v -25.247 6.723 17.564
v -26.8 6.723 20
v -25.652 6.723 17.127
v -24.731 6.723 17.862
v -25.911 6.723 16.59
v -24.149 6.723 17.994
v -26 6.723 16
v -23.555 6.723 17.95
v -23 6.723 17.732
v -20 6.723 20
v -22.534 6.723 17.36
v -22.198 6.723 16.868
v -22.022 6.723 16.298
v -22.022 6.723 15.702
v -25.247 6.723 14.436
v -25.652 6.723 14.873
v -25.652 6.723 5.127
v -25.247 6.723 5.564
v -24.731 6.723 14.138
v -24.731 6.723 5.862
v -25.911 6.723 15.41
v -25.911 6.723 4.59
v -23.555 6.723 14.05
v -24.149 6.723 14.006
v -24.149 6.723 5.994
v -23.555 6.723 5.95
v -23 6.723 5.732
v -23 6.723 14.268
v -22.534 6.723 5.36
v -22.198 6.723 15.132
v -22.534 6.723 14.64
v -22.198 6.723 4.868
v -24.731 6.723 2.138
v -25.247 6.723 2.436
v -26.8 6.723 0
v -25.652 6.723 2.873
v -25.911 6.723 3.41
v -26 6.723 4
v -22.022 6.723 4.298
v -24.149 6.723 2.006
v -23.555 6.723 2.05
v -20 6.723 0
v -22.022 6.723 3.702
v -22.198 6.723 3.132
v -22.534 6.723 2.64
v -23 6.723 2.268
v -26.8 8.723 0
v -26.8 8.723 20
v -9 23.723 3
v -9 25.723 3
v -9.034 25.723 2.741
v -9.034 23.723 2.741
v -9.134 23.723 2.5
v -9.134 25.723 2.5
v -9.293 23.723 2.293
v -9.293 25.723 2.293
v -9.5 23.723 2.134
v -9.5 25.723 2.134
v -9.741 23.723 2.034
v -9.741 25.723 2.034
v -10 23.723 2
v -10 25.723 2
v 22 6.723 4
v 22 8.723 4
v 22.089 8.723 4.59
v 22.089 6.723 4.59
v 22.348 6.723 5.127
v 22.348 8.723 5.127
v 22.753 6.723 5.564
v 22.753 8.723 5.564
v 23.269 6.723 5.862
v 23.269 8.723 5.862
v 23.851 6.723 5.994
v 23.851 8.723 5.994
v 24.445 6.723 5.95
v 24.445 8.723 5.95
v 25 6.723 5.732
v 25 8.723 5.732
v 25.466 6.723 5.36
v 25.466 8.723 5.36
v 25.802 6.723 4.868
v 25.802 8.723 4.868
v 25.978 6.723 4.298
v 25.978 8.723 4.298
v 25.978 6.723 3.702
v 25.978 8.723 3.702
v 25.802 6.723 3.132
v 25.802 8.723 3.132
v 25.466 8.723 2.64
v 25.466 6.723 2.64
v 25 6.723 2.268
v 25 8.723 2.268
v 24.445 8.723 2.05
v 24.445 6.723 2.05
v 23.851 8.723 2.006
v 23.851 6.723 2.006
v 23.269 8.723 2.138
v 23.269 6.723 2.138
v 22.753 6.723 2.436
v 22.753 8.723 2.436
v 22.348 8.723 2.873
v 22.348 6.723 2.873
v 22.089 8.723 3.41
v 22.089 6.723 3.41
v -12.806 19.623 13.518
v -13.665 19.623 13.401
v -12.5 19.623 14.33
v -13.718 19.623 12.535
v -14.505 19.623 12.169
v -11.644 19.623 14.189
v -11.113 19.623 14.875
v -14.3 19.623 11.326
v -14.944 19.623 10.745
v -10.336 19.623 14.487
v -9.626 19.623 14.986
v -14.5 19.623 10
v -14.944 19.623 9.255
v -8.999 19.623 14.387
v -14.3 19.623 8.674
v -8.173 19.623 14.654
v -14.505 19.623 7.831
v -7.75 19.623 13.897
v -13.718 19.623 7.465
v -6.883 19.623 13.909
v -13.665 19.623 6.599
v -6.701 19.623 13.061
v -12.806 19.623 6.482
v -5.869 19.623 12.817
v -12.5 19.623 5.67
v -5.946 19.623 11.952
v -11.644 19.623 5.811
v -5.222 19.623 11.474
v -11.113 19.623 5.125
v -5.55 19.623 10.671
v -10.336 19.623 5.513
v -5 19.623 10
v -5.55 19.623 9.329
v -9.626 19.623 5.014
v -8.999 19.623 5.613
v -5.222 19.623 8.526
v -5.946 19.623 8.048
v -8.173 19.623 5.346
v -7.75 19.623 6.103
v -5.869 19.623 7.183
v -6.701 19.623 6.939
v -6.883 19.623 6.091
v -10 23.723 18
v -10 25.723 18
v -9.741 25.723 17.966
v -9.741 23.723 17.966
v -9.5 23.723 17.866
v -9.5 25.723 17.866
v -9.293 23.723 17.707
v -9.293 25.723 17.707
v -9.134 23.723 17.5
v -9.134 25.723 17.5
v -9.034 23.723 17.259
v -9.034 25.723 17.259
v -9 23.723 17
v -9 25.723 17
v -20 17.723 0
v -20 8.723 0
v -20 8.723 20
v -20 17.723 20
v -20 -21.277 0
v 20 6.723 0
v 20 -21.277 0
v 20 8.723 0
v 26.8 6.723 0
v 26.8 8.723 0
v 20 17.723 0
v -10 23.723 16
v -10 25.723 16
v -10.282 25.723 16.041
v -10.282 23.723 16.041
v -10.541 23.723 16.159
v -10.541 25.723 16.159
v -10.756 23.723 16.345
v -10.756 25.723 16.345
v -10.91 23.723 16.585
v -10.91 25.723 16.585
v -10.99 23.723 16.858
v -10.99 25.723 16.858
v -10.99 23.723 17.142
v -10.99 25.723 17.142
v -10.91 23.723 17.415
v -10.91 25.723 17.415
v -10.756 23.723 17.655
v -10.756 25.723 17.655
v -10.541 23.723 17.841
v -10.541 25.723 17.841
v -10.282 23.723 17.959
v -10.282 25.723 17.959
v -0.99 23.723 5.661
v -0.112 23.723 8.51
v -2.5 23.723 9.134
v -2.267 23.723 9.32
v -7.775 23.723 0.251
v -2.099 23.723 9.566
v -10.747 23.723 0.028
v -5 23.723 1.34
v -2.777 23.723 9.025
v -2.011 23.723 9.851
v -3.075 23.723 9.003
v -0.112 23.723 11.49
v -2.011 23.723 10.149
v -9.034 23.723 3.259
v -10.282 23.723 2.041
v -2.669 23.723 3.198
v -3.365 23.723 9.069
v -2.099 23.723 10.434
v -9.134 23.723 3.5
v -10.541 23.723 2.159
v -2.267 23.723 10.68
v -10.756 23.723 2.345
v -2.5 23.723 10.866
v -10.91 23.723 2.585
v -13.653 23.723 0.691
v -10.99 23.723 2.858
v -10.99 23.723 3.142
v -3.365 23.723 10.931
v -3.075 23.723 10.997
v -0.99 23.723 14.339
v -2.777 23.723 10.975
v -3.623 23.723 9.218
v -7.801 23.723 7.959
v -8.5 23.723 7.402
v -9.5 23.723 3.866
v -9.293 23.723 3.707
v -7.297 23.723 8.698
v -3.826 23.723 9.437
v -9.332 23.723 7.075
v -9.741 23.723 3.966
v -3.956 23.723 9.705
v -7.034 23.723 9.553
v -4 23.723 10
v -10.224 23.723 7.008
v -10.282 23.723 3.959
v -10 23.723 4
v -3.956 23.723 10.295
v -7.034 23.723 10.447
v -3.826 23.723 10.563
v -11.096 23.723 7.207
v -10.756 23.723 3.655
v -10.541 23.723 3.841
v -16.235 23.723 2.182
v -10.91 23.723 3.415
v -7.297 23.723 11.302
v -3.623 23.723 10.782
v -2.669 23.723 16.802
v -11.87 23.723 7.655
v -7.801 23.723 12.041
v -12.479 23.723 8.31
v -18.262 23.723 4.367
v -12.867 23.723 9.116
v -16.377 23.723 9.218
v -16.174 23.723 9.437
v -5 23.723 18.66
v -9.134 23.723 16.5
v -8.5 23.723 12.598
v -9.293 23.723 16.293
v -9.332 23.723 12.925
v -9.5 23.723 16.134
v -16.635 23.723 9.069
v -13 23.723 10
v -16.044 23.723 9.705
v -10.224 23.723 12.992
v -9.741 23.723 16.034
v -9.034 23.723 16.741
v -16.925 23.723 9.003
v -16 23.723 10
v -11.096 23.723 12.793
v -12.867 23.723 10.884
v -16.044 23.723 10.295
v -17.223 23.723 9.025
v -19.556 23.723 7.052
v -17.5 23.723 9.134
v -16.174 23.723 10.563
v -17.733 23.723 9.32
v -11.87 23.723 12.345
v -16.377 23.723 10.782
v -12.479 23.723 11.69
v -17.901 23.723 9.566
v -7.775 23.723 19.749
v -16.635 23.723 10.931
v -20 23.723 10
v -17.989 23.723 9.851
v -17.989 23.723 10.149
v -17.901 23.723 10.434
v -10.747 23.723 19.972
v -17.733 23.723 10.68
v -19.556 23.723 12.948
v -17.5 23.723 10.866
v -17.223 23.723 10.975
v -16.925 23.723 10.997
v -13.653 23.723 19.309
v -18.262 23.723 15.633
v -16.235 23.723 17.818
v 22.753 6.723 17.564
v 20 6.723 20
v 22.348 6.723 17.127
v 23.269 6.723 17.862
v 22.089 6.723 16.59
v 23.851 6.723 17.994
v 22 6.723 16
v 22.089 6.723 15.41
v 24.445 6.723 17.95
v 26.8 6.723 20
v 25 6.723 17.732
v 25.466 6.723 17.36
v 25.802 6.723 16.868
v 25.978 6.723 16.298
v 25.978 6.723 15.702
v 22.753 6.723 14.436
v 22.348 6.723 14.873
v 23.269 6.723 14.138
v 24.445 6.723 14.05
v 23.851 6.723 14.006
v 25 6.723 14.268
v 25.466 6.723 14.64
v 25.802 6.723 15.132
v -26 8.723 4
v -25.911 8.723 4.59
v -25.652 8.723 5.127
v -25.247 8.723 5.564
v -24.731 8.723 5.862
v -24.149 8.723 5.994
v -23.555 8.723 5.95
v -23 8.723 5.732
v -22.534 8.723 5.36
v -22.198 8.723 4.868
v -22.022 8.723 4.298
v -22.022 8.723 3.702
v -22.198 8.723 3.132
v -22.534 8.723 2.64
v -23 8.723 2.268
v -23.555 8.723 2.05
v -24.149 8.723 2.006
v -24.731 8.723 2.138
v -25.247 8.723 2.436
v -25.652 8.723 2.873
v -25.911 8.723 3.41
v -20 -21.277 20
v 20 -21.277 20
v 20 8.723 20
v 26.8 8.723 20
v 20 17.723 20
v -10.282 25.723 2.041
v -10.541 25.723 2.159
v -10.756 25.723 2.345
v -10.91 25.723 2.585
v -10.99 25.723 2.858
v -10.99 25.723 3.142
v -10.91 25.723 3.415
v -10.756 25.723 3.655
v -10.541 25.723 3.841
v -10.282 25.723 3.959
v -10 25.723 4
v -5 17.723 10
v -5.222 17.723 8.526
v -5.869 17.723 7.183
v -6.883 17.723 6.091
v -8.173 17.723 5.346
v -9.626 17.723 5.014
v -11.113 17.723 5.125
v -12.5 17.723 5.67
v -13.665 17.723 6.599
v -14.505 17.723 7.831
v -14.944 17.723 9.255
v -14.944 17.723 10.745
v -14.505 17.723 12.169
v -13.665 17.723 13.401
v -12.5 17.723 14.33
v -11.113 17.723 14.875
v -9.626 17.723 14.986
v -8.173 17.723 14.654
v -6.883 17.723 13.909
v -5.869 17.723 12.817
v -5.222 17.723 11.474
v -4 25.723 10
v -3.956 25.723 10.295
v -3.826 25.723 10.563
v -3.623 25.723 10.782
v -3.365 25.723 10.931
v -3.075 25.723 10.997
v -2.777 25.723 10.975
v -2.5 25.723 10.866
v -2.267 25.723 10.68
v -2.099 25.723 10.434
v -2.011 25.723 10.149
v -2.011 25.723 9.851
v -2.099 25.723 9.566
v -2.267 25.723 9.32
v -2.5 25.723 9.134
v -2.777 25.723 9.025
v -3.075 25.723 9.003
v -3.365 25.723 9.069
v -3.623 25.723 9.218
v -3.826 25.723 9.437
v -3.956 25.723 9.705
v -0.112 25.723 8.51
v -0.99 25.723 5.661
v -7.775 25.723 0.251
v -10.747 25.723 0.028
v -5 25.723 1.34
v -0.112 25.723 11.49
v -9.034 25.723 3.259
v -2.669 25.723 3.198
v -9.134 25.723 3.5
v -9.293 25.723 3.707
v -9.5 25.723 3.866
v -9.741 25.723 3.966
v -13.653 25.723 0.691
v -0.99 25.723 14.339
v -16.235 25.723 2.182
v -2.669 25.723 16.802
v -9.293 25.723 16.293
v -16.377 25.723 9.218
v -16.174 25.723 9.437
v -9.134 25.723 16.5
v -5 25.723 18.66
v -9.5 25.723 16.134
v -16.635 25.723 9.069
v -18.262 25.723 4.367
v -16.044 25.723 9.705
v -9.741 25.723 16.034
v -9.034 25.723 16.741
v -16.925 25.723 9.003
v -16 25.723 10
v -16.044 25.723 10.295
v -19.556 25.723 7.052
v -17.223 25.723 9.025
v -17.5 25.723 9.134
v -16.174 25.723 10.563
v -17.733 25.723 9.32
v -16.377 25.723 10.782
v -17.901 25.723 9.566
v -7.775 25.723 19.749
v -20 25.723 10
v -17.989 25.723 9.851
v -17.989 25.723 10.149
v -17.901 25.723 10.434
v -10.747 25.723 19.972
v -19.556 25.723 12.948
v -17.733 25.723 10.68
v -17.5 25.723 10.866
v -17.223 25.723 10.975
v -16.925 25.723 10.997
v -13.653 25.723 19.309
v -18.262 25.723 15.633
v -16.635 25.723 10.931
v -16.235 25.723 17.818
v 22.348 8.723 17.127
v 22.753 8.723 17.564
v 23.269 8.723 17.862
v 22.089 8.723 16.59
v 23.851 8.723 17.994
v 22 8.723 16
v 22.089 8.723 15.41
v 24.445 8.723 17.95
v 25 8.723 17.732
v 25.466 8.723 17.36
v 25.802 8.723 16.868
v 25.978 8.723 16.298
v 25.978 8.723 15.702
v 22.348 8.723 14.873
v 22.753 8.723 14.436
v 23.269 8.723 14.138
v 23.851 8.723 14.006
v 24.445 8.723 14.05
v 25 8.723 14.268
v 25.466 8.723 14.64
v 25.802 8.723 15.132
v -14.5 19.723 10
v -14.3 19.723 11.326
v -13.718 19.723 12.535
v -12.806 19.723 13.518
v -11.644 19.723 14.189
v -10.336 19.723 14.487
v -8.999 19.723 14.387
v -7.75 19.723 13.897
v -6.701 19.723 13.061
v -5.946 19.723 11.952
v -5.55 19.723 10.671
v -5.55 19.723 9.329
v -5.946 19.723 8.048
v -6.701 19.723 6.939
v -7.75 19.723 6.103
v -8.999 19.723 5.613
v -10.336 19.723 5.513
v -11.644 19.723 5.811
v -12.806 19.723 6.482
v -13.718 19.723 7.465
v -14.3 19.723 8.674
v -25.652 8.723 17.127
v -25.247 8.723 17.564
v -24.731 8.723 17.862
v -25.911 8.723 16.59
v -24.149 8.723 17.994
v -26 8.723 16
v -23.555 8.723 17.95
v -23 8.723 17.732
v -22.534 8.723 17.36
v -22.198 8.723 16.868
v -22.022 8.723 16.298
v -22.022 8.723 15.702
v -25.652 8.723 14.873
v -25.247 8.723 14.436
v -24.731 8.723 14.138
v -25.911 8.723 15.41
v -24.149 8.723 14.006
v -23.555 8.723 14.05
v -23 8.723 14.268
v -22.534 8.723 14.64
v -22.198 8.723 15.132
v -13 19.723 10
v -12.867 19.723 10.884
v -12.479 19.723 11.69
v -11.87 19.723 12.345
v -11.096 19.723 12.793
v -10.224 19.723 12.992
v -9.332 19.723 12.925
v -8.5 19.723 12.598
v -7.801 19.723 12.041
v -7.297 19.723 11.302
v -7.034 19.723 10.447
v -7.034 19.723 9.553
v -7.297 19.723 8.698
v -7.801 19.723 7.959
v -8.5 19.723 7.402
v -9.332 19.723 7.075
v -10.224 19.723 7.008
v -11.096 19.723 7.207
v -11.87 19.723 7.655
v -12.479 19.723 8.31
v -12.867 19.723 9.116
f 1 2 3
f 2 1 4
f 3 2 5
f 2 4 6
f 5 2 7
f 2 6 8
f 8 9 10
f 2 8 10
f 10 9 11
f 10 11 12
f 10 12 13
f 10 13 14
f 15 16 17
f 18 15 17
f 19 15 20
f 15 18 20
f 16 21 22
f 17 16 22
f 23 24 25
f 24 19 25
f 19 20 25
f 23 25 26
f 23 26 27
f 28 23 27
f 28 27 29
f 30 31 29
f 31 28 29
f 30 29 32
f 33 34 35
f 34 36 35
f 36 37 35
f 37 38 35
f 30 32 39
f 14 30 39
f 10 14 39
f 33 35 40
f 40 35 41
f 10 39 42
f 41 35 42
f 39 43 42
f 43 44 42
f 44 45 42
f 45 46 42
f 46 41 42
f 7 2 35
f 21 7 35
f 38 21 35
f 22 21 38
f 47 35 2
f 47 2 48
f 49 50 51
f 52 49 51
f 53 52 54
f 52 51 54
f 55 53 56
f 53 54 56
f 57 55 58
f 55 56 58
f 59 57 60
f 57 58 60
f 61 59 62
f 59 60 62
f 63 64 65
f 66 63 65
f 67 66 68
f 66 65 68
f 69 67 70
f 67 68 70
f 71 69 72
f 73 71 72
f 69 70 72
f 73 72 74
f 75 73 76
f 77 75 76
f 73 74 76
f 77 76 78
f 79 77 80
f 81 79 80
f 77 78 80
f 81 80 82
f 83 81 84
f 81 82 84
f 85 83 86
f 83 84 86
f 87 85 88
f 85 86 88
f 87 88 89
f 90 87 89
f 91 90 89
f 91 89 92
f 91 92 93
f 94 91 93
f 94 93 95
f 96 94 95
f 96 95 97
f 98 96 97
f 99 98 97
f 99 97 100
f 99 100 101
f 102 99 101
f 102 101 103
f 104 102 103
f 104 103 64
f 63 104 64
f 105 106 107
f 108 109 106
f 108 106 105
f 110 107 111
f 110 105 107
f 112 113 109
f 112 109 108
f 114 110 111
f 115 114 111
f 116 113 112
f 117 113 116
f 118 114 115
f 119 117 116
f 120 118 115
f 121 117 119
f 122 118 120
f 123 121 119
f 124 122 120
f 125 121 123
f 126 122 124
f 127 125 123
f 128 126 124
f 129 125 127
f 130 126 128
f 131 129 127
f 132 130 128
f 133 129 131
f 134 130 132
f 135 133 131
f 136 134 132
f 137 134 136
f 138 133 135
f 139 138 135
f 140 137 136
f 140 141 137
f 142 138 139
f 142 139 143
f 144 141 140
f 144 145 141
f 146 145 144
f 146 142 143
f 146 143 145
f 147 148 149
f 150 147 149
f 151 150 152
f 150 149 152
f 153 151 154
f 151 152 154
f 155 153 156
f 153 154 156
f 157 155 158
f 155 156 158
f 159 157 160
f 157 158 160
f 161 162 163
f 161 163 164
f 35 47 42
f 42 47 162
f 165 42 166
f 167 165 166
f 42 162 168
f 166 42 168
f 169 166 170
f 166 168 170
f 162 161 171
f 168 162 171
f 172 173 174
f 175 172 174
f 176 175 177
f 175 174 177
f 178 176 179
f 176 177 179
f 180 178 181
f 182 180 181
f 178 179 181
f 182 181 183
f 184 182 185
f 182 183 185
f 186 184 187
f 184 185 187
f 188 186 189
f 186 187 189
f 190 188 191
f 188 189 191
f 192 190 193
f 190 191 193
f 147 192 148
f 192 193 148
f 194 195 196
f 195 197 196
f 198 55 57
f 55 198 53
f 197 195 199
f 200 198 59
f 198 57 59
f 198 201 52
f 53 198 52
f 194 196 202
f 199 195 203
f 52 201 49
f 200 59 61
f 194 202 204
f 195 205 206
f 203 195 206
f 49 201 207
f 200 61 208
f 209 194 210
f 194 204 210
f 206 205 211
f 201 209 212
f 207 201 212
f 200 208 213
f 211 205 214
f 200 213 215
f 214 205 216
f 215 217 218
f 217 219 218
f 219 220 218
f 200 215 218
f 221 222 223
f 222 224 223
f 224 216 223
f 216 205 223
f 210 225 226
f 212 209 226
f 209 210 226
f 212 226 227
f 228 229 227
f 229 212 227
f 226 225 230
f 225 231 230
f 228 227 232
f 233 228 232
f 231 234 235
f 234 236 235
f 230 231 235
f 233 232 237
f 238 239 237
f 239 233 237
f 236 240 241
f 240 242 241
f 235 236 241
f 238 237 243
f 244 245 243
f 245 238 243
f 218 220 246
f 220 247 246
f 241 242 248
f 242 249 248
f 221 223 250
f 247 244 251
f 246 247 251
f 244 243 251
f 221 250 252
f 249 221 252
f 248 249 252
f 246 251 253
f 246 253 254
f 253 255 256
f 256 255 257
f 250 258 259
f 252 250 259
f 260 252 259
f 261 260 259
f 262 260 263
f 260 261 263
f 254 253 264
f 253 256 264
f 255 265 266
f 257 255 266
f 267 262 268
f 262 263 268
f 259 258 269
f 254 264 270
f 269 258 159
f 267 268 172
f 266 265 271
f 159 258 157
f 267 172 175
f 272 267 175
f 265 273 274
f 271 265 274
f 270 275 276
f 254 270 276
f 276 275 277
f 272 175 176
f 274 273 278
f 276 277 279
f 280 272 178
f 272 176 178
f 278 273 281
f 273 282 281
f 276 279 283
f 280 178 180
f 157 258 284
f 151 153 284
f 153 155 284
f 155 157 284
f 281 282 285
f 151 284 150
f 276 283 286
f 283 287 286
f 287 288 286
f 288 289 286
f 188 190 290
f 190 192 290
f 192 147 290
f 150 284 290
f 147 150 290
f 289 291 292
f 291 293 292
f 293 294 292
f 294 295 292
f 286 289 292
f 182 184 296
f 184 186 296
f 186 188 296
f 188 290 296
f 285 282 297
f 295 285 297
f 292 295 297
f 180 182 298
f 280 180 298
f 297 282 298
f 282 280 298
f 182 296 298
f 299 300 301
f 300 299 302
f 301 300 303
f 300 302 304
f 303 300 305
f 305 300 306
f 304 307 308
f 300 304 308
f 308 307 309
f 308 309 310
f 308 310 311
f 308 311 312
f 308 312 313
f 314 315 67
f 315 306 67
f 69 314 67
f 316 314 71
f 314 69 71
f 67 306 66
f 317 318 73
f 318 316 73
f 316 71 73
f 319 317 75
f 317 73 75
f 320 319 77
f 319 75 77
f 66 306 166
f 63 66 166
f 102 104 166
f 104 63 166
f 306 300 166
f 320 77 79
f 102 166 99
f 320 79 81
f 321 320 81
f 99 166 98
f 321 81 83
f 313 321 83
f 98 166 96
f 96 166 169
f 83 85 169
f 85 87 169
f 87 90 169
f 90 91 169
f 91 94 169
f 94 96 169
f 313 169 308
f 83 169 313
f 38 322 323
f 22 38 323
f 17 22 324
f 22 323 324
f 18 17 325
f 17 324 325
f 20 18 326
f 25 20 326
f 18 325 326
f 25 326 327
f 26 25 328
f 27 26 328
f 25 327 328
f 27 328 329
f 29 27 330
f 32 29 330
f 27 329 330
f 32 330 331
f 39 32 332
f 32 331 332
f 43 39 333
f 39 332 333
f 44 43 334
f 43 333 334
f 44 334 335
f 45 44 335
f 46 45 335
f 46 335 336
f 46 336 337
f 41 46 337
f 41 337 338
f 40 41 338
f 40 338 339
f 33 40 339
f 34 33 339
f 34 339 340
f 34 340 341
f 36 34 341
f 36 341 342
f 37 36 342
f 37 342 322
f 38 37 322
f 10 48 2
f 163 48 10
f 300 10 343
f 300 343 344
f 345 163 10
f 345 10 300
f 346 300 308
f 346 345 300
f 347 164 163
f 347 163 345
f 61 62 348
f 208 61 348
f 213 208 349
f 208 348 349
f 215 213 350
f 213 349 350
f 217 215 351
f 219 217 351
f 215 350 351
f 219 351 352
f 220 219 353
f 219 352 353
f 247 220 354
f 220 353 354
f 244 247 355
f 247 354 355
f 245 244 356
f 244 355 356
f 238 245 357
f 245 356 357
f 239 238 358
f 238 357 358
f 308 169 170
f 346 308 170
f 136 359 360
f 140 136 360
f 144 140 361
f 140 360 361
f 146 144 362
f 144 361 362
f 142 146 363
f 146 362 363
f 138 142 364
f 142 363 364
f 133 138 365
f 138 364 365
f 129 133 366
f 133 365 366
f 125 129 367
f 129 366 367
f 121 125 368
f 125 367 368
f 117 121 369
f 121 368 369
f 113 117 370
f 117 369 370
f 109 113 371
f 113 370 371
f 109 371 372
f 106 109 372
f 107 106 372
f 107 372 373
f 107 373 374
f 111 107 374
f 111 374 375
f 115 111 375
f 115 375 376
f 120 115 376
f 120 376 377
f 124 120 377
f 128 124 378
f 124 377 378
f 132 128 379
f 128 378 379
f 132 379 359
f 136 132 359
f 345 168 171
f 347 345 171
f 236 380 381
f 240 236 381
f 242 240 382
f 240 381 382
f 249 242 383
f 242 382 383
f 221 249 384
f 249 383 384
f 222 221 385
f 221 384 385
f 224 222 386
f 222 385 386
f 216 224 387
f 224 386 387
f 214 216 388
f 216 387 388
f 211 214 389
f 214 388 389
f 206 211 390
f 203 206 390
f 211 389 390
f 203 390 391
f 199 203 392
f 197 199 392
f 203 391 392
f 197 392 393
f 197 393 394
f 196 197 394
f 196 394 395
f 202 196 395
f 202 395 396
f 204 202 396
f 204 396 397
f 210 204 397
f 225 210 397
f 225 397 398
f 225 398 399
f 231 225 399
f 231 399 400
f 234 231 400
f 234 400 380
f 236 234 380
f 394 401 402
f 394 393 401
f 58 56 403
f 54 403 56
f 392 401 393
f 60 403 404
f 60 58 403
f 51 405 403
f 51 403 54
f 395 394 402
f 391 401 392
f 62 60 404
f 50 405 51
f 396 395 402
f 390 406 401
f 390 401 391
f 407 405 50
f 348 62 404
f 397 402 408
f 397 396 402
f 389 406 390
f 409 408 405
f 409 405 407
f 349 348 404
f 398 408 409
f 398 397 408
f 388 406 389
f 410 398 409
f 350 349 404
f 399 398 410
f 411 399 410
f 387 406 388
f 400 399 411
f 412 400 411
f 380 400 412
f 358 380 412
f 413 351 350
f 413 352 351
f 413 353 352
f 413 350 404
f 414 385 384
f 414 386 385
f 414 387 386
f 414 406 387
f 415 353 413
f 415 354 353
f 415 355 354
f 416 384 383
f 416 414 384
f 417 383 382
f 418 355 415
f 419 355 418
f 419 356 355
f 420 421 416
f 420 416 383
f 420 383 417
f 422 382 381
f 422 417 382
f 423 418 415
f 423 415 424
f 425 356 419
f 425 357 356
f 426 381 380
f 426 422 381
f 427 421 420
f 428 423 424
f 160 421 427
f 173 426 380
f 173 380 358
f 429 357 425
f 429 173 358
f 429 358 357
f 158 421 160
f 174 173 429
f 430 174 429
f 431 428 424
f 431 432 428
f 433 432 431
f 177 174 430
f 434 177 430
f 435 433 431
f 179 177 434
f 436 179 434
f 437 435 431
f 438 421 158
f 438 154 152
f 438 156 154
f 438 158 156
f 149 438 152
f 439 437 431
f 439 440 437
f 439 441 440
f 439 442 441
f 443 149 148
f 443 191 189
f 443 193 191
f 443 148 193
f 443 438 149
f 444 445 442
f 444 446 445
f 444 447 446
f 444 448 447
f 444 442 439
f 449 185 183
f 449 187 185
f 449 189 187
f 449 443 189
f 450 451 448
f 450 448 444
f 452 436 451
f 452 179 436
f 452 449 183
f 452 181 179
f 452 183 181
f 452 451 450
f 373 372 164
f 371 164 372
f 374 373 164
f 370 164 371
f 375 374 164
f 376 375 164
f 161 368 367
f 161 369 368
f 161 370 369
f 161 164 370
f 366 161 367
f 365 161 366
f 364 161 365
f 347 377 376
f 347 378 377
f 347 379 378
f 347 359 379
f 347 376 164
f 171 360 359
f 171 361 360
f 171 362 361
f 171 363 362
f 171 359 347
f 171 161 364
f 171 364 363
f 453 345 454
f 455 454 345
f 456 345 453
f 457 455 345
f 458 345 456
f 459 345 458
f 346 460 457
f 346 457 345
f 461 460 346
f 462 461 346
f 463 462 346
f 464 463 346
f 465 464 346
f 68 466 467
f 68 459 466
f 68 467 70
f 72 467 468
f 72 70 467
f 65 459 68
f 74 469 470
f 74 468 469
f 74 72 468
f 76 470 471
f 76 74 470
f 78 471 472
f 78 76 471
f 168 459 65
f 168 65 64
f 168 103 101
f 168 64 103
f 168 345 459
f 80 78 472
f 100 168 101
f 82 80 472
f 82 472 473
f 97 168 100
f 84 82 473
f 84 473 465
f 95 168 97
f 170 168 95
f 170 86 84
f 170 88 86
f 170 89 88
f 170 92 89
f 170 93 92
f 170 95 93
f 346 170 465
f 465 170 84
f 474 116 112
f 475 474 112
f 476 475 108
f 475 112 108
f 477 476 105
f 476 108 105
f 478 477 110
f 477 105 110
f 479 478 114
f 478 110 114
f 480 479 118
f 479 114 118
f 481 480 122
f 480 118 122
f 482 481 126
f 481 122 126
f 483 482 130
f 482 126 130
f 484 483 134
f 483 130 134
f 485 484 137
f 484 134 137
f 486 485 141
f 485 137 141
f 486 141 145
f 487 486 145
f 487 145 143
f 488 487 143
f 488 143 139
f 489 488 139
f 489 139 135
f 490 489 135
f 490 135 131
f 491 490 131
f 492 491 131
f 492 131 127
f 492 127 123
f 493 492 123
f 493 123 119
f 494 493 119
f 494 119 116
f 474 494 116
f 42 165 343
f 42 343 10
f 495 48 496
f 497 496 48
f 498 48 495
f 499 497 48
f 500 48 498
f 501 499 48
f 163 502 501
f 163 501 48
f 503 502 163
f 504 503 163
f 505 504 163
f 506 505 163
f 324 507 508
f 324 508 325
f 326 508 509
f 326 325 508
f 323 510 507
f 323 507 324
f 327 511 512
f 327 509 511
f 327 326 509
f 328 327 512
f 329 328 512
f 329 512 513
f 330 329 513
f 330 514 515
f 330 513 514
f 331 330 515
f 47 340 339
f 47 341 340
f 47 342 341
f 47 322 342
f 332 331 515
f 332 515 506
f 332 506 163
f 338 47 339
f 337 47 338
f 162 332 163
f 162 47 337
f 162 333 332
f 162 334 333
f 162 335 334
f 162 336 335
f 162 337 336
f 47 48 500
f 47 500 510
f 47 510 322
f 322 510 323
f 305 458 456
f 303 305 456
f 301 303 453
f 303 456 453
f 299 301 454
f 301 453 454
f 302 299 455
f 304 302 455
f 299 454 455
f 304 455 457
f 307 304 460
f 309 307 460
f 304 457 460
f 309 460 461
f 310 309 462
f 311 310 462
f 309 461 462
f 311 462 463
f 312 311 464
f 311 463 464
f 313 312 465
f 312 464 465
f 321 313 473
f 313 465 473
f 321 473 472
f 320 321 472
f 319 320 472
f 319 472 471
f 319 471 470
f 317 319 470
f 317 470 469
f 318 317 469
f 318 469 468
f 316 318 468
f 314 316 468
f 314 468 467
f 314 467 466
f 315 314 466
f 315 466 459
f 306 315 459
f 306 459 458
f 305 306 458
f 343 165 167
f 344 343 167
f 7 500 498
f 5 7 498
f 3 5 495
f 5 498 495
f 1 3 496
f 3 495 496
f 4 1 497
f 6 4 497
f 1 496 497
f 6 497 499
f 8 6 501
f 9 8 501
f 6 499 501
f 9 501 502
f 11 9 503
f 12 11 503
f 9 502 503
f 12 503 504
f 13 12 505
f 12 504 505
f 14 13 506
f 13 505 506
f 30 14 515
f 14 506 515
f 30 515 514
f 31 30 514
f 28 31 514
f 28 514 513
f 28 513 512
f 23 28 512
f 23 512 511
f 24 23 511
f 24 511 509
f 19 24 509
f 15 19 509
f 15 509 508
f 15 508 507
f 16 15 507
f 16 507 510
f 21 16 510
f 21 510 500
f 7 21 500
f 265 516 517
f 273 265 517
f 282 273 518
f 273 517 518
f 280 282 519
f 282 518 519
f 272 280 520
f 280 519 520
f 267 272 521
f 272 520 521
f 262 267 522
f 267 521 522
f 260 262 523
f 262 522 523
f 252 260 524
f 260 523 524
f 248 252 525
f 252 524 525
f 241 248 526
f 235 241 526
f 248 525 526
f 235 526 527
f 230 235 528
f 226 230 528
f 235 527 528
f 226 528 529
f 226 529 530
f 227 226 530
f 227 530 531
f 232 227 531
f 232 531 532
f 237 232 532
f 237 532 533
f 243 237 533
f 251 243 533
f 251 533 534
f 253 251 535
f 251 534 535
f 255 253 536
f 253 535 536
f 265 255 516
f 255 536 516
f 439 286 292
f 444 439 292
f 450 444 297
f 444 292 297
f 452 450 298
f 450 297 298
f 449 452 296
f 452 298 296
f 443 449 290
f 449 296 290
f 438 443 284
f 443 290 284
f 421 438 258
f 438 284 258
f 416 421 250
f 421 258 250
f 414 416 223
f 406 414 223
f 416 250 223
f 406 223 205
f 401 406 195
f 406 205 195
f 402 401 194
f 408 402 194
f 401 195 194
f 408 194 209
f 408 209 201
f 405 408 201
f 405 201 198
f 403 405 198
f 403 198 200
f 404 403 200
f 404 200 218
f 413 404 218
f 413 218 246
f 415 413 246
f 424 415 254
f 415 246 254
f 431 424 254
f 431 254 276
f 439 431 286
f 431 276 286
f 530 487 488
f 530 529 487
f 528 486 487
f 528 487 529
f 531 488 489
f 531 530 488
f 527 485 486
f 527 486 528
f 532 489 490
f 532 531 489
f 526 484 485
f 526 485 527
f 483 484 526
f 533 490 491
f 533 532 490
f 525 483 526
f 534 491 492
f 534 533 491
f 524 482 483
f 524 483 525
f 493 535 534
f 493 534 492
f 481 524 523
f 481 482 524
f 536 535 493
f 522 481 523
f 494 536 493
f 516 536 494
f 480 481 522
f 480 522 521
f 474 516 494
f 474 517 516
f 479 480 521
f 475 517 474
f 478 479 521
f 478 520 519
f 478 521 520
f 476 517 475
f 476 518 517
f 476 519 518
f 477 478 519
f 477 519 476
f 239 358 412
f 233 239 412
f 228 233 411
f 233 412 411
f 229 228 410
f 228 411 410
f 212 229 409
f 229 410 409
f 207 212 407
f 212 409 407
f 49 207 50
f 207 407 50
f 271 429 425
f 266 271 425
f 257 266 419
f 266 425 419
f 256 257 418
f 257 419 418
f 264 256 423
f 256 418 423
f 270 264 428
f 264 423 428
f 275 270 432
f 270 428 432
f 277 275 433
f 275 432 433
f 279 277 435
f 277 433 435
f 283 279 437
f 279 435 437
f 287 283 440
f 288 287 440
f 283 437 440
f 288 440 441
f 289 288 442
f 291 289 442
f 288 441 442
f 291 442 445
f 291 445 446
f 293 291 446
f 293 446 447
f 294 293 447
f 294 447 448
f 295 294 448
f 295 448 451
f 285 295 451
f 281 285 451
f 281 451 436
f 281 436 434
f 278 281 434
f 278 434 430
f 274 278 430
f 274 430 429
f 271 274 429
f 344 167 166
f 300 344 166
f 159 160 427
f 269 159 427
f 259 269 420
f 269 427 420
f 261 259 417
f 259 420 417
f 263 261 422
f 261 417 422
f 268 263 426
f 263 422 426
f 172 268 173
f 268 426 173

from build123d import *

# Parameters (mm, degrees)
SKETCH1_W           = 6.8
SKETCH1_H           = 2
SKETCH1_W_2         = 40
SKETCH1_H_2         = 39
BOSS_EXTRUDE1_DEPTH = 20
SKETCH2_R           = 4.5
BOSS_EXTRUDE2_DEPTH = 2
SKETCH3_R           = 5
BOSS_EXTRUDE3_DEPTH = 1.9
SKETCH4_R           = 3
BOSS_EXTRUDE4_DEPTH = 4
SKETCH5_R           = 10
BOSS_EXTRUDE5_DEPTH = 2
SKETCH6_R           = 2
CUT_EXTRUDE1_DEPTH  = 10
SKETCH7_R           = 2
CUT_EXTRUDE2_DEPTH  = 10
CUT_EXTRUDE3_DEPTH  = 5


with BuildPart() as part:
    # Sketch1 → Boss-Extrude1 (new body)
    with BuildSketch(Plane.XY):
        with Locations((-23.4, 7.722986842)):
            Rectangle(SKETCH1_W, SKETCH1_H)
        with Locations((0, -1.777013158)):
            Rectangle(SKETCH1_W_2, SKETCH1_H_2)
        with Locations((23.4, 7.722986842)):
            Rectangle(SKETCH1_W, SKETCH1_H)
    extrude(amount=BOSS_EXTRUDE1_DEPTH)

    # Sketch2 → Boss-Extrude2 (add)
    with BuildSketch(Plane(origin=(0, 17.722986842, 0), x_dir=(1, 0, 0), z_dir=(0, 1, 0))):
        with Locations(Location((-10, -10, 0), (0, 0, 180))):
            Circle(SKETCH2_R)
    extrude(amount=BOSS_EXTRUDE2_DEPTH)

    # Sketch3 → Boss-Extrude3 (add)
    with BuildSketch(Plane(origin=(0, 17.722986842, 0), x_dir=(1, 0, 0), z_dir=(0, 1, 0))):
        with Locations((-10, -10)):
            Circle(SKETCH3_R)
    extrude(amount=BOSS_EXTRUDE3_DEPTH)

    # Sketch4 → Boss-Extrude4 (add)
    with BuildSketch(Plane(origin=(0, 19.722986842, 0), x_dir=(1, 0, 0), z_dir=(0, 1, 0))):
        with Locations(Location((-10, -10, 0), (0, 0, 180))):
            Circle(SKETCH4_R)
    extrude(amount=BOSS_EXTRUDE4_DEPTH)

    # Sketch5 → Boss-Extrude5 (add)
    with BuildSketch(Plane(origin=(0, 23.722986842, 0), x_dir=(1, 0, 0), z_dir=(0, 1, 0))):
        with Locations(Location((-10, -10, 0), (0, 0, 180))):
            Circle(SKETCH5_R)
    extrude(amount=BOSS_EXTRUDE5_DEPTH)

    # Sketch6 → Cut-Extrude1 (cut)
    with BuildSketch(Plane(origin=(0, 8.722986842, 0), x_dir=(1, 0, 0), z_dir=(0, 1, 0))):
        with Locations(Location((24, -4, 0), (0, 0, 180))):
            Circle(SKETCH6_R)
        with Locations(Location((24, -16, 0), (0, 0, 180))):
            Circle(SKETCH6_R)
    extrude(amount=-CUT_EXTRUDE1_DEPTH, mode=Mode.SUBTRACT)

    # Sketch7 → Cut-Extrude2 (cut)
    with BuildSketch(Plane(origin=(0, 8.722986842, 0), x_dir=(1, 0, 0), z_dir=(0, 1, 0))):
        with Locations(Location((-24, -4, 0), (0, 0, 180))):
            Circle(SKETCH7_R)
        with Locations(Location((-24, -16, 0), (0, 0, 180))):
            Circle(SKETCH7_R)
    extrude(amount=-CUT_EXTRUDE2_DEPTH, mode=Mode.SUBTRACT)

    # Sketch8 → Cut-Extrude3 (cut)
    with BuildSketch(Plane(origin=(0, 25.722986842, 0), x_dir=(1, 0, 0), z_dir=(0, 1, 0))):
        with BuildLine():
            ThreePointArc((-18, -10), (-17, -11), (-16, -10))
            Line((-16, -10), (-18, -10))
        make_face()
        with BuildLine():
            Line((-18, -10), (-16, -10))
            ThreePointArc((-16, -10), (-17, -9), (-18, -10))
        make_face()
        with BuildLine():
            ThreePointArc((-10, -2), (-11, -3), (-10, -4))
            Line((-10, -4), (-10, -2))
        make_face()
        with BuildLine():
            Line((-10, -2), (-10, -4))
            ThreePointArc((-10, -4), (-9.292893219, -3.707106781), (-9, -3))
            ThreePointArc((-9, -3), (-9.292893219, -2.292893219), (-10, -2))
        make_face()
        with BuildLine():
            ThreePointArc((-2, -10), (-3, -9), (-4, -10))
            Line((-4, -10), (-2, -10))
        make_face()
        with BuildLine():
            Line((-2, -10), (-4, -10))
            ThreePointArc((-4, -10), (-3, -11), (-2, -10))
        make_face()
        with BuildLine():
            ThreePointArc((-9, -17), (-9.292893219, -16.292893219), (-10, -16))
            Line((-10, -16), (-10, -18))
            ThreePointArc((-10, -18), (-9.292893219, -17.707106781), (-9, -17))
        make_face()
        with BuildLine():
            Line((-10, -18), (-10, -16))
            ThreePointArc((-10, -16), (-11, -17), (-10, -18))
        make_face()
    extrude(amount=-CUT_EXTRUDE3_DEPTH, mode=Mode.SUBTRACT)


solid = part.part
